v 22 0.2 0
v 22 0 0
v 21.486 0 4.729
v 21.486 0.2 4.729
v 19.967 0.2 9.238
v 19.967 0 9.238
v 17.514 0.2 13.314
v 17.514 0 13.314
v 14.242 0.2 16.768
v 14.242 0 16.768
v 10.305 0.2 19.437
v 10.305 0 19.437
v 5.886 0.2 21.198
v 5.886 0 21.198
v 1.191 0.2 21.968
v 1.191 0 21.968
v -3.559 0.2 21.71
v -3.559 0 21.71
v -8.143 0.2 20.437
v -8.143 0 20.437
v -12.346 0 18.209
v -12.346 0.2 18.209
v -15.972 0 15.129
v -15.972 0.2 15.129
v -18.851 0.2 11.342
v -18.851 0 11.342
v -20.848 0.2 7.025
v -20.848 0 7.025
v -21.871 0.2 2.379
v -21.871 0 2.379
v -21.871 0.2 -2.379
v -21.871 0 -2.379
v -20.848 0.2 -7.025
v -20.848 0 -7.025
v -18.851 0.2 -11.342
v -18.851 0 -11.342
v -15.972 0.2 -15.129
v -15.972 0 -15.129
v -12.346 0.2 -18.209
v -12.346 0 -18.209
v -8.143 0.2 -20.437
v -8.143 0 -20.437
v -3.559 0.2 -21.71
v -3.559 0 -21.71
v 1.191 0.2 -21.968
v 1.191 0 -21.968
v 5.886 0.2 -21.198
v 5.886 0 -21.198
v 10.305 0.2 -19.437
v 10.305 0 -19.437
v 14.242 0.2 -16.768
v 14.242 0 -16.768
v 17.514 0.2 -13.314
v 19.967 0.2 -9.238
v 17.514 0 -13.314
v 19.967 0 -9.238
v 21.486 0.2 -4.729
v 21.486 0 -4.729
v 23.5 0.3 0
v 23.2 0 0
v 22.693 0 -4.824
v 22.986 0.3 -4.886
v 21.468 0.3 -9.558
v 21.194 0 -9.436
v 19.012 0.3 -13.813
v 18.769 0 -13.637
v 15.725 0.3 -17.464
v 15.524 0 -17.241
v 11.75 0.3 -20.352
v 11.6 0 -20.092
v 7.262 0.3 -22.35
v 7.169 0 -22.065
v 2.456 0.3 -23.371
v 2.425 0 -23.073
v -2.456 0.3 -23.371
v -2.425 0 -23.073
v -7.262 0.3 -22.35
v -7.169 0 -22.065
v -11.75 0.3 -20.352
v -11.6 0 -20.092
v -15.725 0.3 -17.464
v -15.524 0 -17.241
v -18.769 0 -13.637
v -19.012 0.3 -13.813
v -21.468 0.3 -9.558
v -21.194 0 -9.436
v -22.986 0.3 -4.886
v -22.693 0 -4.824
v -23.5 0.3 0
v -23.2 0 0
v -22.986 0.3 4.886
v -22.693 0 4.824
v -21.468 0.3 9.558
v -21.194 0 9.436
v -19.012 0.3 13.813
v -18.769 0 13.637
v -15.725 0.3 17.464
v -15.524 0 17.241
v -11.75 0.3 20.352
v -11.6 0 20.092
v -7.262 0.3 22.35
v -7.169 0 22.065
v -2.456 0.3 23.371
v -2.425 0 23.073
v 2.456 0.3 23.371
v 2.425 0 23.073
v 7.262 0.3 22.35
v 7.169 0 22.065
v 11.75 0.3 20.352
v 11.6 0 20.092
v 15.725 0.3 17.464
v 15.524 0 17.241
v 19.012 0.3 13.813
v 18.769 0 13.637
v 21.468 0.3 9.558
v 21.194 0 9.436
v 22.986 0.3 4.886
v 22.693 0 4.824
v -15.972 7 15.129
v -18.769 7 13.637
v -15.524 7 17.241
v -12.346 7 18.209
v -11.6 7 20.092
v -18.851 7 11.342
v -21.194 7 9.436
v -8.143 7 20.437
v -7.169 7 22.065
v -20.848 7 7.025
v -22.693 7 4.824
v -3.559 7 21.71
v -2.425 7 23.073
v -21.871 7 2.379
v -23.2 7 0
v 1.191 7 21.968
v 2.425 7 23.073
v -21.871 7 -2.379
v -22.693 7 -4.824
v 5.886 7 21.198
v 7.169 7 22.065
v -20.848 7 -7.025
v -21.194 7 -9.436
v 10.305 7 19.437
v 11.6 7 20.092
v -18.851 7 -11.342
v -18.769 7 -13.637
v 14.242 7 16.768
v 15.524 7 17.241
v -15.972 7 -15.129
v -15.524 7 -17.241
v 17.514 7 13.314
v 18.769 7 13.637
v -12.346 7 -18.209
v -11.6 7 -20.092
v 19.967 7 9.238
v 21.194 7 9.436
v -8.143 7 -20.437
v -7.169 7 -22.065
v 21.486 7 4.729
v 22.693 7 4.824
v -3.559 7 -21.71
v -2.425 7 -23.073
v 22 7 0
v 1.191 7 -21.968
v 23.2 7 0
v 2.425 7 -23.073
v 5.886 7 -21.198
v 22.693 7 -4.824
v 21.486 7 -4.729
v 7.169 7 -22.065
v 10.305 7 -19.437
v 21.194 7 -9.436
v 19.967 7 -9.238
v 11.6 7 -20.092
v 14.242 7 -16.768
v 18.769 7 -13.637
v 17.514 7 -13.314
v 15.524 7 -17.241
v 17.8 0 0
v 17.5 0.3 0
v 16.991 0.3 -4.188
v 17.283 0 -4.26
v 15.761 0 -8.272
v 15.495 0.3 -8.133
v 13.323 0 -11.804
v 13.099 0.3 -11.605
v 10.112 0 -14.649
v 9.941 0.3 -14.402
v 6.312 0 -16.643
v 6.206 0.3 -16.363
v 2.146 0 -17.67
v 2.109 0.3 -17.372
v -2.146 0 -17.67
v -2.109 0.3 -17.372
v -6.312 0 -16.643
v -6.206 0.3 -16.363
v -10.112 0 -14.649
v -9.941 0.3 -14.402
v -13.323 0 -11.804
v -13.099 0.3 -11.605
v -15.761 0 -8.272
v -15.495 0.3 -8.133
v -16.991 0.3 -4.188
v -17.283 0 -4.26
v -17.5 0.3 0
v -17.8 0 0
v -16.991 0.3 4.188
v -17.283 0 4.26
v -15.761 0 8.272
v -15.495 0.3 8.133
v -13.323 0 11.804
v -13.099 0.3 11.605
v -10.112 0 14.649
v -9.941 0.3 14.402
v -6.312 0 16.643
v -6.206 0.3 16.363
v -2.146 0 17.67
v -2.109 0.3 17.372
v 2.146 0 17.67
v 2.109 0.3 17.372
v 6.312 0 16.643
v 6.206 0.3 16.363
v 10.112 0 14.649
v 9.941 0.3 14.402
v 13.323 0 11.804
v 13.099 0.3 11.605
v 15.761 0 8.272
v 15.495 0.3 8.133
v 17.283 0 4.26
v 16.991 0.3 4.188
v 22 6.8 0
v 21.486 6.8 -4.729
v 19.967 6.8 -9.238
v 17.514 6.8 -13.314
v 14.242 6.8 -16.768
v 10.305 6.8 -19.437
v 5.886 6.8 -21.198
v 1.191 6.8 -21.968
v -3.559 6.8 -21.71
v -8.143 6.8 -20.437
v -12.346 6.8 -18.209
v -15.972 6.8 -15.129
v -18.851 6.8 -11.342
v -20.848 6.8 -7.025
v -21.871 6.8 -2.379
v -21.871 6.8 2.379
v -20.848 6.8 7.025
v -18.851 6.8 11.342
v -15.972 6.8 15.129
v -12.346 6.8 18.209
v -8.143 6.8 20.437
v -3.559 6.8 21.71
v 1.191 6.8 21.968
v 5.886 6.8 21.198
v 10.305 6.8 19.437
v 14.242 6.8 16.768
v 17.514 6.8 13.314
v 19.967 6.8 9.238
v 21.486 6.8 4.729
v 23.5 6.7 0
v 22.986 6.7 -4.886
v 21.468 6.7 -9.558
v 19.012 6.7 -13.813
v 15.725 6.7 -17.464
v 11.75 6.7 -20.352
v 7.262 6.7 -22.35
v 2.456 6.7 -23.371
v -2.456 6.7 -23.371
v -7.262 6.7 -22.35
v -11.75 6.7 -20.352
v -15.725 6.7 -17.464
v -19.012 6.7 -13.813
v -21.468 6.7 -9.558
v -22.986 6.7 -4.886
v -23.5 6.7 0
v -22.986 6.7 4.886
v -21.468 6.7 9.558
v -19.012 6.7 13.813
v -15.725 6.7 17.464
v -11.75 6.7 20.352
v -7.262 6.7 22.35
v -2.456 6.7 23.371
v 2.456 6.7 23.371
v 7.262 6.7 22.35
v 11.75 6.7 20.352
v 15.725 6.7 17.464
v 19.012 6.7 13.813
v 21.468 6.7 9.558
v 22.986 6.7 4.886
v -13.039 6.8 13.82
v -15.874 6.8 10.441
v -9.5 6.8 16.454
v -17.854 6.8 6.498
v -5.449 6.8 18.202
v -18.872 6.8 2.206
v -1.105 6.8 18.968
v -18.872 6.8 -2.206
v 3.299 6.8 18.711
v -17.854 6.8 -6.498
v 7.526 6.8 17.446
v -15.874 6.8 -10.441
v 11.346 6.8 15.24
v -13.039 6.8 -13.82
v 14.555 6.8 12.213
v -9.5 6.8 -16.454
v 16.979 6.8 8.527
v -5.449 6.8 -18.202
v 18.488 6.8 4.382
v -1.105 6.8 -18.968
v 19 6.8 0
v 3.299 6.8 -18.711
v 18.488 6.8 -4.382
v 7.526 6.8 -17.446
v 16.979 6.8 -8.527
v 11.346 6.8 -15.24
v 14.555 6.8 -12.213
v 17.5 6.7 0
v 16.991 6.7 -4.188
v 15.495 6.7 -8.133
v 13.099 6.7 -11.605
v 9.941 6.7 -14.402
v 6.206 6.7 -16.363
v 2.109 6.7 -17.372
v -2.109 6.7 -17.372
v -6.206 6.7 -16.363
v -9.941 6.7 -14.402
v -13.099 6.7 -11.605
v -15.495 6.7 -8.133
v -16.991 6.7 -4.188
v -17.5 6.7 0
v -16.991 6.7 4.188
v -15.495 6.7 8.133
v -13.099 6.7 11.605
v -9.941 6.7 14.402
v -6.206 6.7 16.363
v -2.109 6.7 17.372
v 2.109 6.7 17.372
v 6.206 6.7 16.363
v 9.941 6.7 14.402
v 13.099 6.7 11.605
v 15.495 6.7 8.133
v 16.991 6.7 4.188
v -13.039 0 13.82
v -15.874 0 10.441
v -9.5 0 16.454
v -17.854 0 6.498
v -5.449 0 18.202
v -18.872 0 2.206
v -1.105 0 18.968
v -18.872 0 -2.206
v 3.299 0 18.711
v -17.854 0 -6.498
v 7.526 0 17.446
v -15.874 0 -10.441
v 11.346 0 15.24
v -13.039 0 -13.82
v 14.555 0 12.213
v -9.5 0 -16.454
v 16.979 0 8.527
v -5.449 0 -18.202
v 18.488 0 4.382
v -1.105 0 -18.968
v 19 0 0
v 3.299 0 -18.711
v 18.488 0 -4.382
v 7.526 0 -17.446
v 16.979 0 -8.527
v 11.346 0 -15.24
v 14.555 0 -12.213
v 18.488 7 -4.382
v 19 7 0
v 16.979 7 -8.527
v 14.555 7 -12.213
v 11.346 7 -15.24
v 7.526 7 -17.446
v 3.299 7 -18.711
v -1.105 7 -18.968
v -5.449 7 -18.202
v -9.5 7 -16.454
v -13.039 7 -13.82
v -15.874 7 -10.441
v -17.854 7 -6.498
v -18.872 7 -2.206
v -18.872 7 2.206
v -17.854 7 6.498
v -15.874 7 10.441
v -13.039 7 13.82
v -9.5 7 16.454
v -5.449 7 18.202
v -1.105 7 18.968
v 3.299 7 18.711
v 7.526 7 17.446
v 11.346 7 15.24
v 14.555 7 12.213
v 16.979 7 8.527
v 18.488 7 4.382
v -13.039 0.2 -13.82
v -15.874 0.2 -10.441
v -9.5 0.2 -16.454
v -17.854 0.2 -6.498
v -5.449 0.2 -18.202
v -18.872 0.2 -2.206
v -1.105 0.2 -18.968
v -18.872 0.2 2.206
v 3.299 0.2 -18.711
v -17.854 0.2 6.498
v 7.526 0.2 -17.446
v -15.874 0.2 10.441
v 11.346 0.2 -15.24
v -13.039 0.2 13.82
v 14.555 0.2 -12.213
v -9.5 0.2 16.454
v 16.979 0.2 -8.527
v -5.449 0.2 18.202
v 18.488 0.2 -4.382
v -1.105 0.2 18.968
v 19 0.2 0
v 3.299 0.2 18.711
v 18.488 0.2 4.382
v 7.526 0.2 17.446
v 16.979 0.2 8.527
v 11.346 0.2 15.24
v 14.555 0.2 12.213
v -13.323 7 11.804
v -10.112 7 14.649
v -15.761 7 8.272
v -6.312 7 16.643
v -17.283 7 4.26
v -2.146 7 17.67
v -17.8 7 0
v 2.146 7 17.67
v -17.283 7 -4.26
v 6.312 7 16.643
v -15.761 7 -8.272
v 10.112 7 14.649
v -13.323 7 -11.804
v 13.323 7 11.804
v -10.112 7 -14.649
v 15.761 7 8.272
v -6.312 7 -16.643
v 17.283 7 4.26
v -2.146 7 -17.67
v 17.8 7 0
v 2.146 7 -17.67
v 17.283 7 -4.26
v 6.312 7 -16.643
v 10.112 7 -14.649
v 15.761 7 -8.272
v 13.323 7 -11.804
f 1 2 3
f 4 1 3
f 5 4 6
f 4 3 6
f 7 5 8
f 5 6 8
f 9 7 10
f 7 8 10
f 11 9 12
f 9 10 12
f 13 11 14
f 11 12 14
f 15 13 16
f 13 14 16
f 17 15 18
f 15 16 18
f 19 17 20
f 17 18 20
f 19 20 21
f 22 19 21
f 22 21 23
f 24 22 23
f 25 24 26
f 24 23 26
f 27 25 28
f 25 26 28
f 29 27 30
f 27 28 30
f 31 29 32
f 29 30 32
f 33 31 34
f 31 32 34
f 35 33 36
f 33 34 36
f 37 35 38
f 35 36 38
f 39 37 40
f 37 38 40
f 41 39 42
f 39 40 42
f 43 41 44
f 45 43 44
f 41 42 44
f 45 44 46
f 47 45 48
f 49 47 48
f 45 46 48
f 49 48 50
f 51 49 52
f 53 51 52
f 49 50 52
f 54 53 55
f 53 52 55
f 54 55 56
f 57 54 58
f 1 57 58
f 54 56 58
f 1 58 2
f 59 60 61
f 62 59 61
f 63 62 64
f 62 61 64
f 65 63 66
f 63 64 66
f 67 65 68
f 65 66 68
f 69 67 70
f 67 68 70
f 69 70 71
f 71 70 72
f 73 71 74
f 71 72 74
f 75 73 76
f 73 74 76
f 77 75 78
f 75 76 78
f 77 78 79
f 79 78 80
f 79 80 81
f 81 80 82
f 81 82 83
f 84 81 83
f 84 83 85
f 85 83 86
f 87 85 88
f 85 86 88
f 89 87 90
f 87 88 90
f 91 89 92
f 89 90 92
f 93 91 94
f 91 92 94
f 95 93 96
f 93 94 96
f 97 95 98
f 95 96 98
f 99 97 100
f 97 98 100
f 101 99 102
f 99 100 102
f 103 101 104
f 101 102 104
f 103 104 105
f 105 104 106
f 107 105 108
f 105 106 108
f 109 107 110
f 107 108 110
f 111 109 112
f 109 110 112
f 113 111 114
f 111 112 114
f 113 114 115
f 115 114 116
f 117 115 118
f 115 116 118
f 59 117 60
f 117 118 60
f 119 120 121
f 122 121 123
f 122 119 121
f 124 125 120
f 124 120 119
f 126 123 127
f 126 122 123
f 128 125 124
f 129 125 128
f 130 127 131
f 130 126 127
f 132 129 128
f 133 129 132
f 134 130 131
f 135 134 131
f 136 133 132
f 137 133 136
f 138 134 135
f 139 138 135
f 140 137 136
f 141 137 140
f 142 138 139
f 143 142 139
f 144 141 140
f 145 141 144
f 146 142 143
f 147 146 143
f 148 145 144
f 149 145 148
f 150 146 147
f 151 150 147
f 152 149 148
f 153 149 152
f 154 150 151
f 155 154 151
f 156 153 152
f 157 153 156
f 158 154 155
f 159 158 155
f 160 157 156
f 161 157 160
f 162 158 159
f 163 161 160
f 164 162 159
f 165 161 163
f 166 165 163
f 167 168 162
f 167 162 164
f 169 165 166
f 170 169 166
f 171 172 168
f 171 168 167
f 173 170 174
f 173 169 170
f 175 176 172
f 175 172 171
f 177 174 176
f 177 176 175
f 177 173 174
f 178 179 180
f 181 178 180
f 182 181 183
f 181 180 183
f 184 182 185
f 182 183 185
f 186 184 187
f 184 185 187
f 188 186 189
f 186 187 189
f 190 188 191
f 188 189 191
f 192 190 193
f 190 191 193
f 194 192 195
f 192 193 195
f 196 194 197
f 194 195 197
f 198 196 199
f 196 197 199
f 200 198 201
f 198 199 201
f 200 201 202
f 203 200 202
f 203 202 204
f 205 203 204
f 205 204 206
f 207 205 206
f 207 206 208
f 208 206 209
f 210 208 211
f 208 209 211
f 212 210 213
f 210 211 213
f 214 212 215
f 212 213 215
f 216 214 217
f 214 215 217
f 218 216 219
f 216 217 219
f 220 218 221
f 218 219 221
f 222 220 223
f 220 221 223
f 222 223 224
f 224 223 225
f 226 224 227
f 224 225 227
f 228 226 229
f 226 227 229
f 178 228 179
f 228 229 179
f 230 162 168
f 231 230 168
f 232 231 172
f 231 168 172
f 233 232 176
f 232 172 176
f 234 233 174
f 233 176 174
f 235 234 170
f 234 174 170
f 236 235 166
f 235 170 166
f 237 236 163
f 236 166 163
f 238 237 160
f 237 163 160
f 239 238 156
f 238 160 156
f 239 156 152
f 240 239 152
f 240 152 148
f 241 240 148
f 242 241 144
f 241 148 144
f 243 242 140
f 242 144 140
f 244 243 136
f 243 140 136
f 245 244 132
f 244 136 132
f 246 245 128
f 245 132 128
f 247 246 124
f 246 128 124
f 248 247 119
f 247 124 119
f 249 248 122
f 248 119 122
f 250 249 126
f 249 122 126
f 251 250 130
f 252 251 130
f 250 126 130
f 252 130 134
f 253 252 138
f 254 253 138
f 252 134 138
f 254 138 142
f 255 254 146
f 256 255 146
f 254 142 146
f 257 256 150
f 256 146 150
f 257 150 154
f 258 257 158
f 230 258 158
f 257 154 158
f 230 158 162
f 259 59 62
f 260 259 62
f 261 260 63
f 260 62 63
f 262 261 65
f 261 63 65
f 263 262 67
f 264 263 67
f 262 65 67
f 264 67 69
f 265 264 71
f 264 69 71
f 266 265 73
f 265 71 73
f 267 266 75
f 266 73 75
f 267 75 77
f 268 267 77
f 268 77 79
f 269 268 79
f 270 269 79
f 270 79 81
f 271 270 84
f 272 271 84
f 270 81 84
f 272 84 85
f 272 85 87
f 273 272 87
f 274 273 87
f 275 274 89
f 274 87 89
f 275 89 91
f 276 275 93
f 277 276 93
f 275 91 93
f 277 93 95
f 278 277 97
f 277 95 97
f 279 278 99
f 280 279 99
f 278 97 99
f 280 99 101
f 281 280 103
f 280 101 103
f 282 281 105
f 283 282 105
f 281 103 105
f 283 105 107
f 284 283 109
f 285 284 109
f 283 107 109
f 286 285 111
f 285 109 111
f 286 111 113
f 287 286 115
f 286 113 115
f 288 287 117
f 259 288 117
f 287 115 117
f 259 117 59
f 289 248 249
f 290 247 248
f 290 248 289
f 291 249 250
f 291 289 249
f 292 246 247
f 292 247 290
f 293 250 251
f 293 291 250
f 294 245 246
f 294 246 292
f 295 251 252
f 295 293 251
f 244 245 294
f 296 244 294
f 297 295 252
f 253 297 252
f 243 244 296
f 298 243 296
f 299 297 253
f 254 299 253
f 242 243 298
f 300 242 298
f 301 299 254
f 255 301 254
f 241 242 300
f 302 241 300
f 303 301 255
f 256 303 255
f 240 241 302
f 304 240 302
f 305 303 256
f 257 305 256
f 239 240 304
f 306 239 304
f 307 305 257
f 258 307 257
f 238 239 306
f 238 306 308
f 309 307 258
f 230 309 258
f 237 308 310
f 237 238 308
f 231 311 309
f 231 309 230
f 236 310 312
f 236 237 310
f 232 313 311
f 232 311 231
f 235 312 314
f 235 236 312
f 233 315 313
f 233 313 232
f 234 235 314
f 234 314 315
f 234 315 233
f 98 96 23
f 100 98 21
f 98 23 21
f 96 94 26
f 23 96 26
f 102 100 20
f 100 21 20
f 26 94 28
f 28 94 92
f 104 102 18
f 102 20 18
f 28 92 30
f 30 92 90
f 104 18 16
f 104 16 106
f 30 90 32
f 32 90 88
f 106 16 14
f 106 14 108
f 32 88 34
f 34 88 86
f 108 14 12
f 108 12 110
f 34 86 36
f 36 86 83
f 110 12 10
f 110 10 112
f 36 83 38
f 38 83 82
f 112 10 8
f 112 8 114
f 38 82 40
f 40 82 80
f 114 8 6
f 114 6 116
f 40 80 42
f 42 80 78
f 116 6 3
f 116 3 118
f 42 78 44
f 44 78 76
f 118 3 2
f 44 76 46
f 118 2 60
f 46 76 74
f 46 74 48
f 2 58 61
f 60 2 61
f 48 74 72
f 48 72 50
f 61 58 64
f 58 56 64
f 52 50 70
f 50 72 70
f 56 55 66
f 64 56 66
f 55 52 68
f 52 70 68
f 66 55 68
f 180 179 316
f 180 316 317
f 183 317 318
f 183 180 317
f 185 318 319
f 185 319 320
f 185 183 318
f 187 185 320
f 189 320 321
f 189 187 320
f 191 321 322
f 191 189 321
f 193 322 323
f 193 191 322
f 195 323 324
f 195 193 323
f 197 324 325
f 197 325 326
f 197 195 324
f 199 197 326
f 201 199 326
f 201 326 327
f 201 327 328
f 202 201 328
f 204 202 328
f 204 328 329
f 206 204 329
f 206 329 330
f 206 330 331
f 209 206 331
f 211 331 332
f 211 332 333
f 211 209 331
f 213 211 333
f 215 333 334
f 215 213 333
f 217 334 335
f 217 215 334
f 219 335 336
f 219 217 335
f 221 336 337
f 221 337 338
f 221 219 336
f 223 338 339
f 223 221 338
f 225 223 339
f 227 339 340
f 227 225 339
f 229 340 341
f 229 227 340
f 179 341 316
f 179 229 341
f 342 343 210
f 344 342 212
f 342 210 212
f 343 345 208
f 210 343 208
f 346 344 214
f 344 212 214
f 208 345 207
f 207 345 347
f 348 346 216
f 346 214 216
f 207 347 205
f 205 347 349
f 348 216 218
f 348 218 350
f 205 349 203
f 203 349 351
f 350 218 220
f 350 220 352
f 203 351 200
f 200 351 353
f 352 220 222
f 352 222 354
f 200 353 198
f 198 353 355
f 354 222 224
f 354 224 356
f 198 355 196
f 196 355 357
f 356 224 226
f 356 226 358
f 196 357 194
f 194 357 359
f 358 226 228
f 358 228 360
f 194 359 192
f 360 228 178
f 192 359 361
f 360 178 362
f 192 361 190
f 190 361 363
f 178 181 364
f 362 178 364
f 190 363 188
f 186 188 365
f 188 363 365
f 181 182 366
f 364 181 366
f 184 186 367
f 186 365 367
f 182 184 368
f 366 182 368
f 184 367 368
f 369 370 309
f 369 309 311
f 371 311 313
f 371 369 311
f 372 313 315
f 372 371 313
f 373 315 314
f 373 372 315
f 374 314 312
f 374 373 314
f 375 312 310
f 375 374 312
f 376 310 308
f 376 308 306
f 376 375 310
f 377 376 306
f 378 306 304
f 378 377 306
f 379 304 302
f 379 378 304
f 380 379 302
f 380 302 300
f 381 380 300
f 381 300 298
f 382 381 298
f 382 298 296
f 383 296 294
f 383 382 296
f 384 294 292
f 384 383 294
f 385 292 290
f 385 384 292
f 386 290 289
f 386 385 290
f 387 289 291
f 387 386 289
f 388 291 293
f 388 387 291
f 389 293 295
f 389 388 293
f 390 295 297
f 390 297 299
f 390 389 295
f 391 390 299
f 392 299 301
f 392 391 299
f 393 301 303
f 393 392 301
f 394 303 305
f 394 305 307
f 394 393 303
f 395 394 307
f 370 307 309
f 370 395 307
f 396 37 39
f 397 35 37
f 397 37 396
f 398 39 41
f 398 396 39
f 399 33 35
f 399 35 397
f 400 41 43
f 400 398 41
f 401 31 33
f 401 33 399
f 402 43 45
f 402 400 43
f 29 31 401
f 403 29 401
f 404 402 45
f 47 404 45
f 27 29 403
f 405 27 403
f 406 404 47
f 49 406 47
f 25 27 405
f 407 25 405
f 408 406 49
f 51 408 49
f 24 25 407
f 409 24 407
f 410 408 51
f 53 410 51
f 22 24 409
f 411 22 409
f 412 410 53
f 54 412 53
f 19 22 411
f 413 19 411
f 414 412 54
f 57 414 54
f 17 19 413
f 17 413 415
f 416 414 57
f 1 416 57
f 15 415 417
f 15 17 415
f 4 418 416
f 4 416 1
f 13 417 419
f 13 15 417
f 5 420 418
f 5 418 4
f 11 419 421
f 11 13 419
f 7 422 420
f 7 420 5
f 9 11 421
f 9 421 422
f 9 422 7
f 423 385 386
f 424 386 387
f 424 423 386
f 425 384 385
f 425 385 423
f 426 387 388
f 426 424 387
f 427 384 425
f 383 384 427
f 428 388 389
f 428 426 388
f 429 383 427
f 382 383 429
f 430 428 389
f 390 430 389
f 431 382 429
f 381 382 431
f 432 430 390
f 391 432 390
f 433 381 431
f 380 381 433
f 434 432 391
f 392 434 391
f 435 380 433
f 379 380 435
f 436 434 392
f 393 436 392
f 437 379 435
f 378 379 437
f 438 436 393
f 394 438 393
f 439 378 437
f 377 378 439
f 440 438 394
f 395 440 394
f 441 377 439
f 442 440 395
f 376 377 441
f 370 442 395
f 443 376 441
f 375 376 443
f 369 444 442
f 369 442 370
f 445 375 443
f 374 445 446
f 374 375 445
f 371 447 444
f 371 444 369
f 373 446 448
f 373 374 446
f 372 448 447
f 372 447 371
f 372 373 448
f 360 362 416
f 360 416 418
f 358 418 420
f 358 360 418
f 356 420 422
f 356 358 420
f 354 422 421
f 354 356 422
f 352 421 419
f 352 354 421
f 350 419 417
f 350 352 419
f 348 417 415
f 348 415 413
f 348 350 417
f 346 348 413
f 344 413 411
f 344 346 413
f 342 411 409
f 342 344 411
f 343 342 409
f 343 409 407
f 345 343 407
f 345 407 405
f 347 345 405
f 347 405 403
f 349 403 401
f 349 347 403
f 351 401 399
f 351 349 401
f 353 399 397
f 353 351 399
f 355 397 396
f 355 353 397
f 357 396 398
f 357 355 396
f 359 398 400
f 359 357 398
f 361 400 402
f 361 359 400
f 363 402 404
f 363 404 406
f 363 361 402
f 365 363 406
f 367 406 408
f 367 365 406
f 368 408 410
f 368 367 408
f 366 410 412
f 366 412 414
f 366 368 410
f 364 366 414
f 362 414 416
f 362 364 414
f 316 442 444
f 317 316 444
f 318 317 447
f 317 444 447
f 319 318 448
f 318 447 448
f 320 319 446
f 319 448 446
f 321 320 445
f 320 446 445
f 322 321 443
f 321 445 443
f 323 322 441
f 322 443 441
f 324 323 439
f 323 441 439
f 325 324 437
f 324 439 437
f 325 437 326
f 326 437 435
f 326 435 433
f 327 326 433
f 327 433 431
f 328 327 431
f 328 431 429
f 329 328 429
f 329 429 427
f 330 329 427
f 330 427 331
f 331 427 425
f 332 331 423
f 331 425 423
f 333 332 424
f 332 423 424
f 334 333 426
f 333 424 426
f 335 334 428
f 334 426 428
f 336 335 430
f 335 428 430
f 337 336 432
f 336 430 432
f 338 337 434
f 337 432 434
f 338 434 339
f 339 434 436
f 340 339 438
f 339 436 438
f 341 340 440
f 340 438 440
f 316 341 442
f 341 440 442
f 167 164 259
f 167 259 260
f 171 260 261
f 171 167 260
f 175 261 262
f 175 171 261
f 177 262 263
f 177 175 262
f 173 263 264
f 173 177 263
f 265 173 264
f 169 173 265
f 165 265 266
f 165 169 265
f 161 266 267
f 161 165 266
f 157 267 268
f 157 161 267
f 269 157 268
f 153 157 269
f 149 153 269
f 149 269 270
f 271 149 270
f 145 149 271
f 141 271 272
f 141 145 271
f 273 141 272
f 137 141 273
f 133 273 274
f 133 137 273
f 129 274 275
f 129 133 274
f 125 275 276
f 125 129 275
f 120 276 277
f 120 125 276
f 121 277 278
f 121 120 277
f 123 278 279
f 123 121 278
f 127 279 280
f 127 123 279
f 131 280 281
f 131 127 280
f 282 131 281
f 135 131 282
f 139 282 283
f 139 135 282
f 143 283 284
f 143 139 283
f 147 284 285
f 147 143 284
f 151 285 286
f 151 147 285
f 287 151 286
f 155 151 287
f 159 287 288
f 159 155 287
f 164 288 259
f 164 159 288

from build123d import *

# Parameters (mm, degrees)
SKETCH1_R           = 23.5
SKETCH1_R_2         = 17.5
BOSS_EXTRUDE1_DEPTH = 7
SKETCH2_R           = 22
SKETCH2_R_2         = 19
CUT_EXTRUDE1_DEPTH  = 0.2
CHAMFER1_SIZE       = 0.3
SKETCH3_R           = 22
SKETCH3_R_2         = 19
CUT_EXTRUDE2_DEPTH  = 0.2


with BuildPart() as part:
    # Sketch1 → Boss-Extrude1 (new body)
    with BuildSketch(Plane(origin=(0, 0, 0), x_dir=(1, 0, 0), z_dir=(0, 1, 0))):
        Circle(SKETCH1_R)
        Circle(SKETCH1_R_2, mode=Mode.SUBTRACT)
    extrude(amount=BOSS_EXTRUDE1_DEPTH)

    # Sketch2 → Cut-Extrude1 (cut)
    with BuildSketch(Plane(origin=(0, 7, 0), x_dir=(1, 0, 0), z_dir=(0, 1, 0))):
        Circle(SKETCH2_R)
        Circle(SKETCH2_R_2, mode=Mode.SUBTRACT)
    extrude(amount=-CUT_EXTRUDE1_DEPTH, mode=Mode.SUBTRACT)

    # Chamfer1
    chamfer1_edges = [part.edges().sort_by_distance(p)[0] for p in [
        (-23.5, 0, 0),
        (-23.5, 7, 0),
        (-17.5, 0, 0),
        (-17.5, 7, 0),
    ]]
    chamfer(chamfer1_edges, length=CHAMFER1_SIZE)

    # Sketch3 → Cut-Extrude2 (cut)
    with BuildSketch(Plane.XZ):
        Circle(SKETCH3_R)
        Circle(SKETCH3_R_2, mode=Mode.SUBTRACT)
    extrude(amount=-CUT_EXTRUDE2_DEPTH, mode=Mode.SUBTRACT)


solid = part.part
